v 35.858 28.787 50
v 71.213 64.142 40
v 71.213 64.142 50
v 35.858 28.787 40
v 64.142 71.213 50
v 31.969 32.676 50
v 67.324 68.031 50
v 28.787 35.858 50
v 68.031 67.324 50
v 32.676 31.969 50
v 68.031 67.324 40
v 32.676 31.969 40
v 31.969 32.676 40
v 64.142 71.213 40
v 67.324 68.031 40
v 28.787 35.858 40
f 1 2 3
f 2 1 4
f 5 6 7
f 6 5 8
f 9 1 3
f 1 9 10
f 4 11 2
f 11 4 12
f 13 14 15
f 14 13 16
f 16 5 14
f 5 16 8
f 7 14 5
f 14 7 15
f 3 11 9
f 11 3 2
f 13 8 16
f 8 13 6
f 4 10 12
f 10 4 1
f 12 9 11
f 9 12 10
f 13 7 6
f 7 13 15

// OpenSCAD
//Paper Holder 2

//Width Of Polyhedron
WidthOfPolyhedron = 100;

//Length Of Polyhedron
LengthOfPolyhedron = 100;

//Height Of Polyhedron
HeightOfPolyhedron = 40;

//Height Of Cube (In Red)
HeightOfCube = 10;

//Width Of Cube (In Red)
WidthOfCube = 10;

//Length Of Cube (In Red)
LengthOfCube = 50;

//Width Of Slot
WidthOfSlot = 1;

//Depth Of Slot
DepthOfSlot = 10;

//Polyhedron
polyhedron( points = [ 
[0,0,0], 
[WidthOfPolyhedron*0.4,0,0], 
[0,LengthOfPolyhedron*0.4,0], 
[WidthOfPolyhedron*0.6,LengthOfPolyhedron*0.4,0], 
[WidthOfPolyhedron*0.4,LengthOfPolyhedron*0.6,0],
[WidthOfPolyhedron,LengthOfPolyhedron*0.6,0],
[WidthOfPolyhedron*0.6,LengthOfPolyhedron,0],
[WidthOfPolyhedron,LengthOfPolyhedron,0], 
[WidthOfPolyhedron*0.2,LengthOfPolyhedron*0.2,HeightOfPolyhedron], 
[WidthOfPolyhedron*0.8,LengthOfPolyhedron*0.8,HeightOfPolyhedron], 
[WidthOfPolyhedron*0.6,LengthOfPolyhedron*0.4,HeightOfPolyhedron], 
[WidthOfPolyhedron*0.4,LengthOfPolyhedron*0.6,HeightOfPolyhedron]
],
faces = [ 
[0,3,1], 
[0,2,4], 
[0,4,3], 
[3,7,5], 
[4,6,7], 
[7,3,4], 
[0,8,1],
[0,2,8], 
[1,8,3], 
[2,4,8], 
[8,11,10], 
[8,10,3], 
[8,4,11], 
[9,10,11], 
[9,3,10], 
[9,11,4], 
[9,5,3], 
[9,4,6], 
[9,7,5], 
[9,6,7]
]);
 
//Cube On Top 
translate([WidthOfPolyhedron/2,LengthOfPolyhedron/2,HeightOfPolyhedron+(1/2*HeightOfCube)]){
    rotate([0,0,-45]){
        difference(){
            color("red")
            cube([WidthOfCube,LengthOfCube,HeightOfCube],center = true);
            color("white")
            cube([WidthOfSlot,LengthOfCube,DepthOfSlot],center = true);
        }
    }
}
